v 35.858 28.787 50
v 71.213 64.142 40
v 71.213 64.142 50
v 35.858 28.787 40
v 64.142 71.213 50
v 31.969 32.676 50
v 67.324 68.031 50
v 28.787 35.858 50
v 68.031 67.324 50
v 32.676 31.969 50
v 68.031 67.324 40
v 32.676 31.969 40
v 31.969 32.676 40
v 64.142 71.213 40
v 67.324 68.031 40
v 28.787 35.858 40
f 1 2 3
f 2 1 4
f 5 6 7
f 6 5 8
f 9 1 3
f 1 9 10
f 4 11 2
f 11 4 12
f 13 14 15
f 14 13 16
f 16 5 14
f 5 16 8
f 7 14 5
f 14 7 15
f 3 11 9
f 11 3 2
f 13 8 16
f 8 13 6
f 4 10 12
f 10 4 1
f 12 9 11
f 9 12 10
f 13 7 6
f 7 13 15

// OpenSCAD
//Paper Holder 2

//Width Of Polyhedron
WidthOfPolyhedron = 100;

//Length Of Polyhedron
LengthOfPolyhedron = 100;

//Height Of Polyhedron
HeightOfPolyhedron = 40;

//Height Of Cube (In Red)
HeightOfCube = 10;

//Width Of Cube (In Red)
WidthOfCube = 10;

//Length Of Cube (In Red)
LengthOfCube = 50;

//Width Of Slot
WidthOfSlot = 1;

//Depth Of Slot
DepthOfSlot = 10;

//Polyhedron
polyhedron( points = [ 
[0,0,0], 
[WidthOfPolyhedron*0.4,0,0], 
[0,LengthOfPolyhedron*0.4,0], 
[WidthOfPolyhedron*0.6,LengthOfPolyhedron*0.4,0], 
[WidthOfPolyhedron*0.4,LengthOfPolyhedron*0.6,0],
[WidthOfPolyhedron,LengthOfPolyhedron*0.6,0],
[WidthOfPolyhedron*0.6,LengthOfPolyhedron,0],
[WidthOfPolyhedron,LengthOfPolyhedron,0], 
[WidthOfPolyhedron*0.2,LengthOfPolyhedron*0.2,HeightOfPolyhedron], 
[WidthOfPolyhedron*0.8,LengthOfPolyhedron*0.8,HeightOfPolyhedron], 
[WidthOfPolyhedron*0.6,LengthOfPolyhedron*0.4,HeightOfPolyhedron], 
[WidthOfPolyhedron*0.4,LengthOfPolyhedron*0.6,HeightOfPolyhedron]
],
faces = [ 
[0,3,1], 
[0,2,4], 
[0,4,3], 
[3,7,5], 
[4,6,7], 
[7,3,4], 
[0,8,1],
[0,2,8], 
[1,8,3], 
[2,4,8], 
[8,11,10], 
[8,10,3], 
[8,4,11], 
[9,10,11], 
[9,3,10], 
[9,11,4], 
[9,5,3], 
[9,4,6], 
[9,7,5], 
[9,6,7]
]);
 
//Cube On Top 
translate([WidthOfPolyhedron/2,LengthOfPolyhedron/2,HeightOfPolyhedron+(1/2*HeightOfCube)]){
    rotate([0,0,-45]){
        difference(){
            color("red")
            cube([WidthOfCube,LengthOfCube,HeightOfCube],center = true);
            color("white")
            cube([WidthOfSlot,LengthOfCube,DepthOfSlot],center = true);
        }
    }
}
